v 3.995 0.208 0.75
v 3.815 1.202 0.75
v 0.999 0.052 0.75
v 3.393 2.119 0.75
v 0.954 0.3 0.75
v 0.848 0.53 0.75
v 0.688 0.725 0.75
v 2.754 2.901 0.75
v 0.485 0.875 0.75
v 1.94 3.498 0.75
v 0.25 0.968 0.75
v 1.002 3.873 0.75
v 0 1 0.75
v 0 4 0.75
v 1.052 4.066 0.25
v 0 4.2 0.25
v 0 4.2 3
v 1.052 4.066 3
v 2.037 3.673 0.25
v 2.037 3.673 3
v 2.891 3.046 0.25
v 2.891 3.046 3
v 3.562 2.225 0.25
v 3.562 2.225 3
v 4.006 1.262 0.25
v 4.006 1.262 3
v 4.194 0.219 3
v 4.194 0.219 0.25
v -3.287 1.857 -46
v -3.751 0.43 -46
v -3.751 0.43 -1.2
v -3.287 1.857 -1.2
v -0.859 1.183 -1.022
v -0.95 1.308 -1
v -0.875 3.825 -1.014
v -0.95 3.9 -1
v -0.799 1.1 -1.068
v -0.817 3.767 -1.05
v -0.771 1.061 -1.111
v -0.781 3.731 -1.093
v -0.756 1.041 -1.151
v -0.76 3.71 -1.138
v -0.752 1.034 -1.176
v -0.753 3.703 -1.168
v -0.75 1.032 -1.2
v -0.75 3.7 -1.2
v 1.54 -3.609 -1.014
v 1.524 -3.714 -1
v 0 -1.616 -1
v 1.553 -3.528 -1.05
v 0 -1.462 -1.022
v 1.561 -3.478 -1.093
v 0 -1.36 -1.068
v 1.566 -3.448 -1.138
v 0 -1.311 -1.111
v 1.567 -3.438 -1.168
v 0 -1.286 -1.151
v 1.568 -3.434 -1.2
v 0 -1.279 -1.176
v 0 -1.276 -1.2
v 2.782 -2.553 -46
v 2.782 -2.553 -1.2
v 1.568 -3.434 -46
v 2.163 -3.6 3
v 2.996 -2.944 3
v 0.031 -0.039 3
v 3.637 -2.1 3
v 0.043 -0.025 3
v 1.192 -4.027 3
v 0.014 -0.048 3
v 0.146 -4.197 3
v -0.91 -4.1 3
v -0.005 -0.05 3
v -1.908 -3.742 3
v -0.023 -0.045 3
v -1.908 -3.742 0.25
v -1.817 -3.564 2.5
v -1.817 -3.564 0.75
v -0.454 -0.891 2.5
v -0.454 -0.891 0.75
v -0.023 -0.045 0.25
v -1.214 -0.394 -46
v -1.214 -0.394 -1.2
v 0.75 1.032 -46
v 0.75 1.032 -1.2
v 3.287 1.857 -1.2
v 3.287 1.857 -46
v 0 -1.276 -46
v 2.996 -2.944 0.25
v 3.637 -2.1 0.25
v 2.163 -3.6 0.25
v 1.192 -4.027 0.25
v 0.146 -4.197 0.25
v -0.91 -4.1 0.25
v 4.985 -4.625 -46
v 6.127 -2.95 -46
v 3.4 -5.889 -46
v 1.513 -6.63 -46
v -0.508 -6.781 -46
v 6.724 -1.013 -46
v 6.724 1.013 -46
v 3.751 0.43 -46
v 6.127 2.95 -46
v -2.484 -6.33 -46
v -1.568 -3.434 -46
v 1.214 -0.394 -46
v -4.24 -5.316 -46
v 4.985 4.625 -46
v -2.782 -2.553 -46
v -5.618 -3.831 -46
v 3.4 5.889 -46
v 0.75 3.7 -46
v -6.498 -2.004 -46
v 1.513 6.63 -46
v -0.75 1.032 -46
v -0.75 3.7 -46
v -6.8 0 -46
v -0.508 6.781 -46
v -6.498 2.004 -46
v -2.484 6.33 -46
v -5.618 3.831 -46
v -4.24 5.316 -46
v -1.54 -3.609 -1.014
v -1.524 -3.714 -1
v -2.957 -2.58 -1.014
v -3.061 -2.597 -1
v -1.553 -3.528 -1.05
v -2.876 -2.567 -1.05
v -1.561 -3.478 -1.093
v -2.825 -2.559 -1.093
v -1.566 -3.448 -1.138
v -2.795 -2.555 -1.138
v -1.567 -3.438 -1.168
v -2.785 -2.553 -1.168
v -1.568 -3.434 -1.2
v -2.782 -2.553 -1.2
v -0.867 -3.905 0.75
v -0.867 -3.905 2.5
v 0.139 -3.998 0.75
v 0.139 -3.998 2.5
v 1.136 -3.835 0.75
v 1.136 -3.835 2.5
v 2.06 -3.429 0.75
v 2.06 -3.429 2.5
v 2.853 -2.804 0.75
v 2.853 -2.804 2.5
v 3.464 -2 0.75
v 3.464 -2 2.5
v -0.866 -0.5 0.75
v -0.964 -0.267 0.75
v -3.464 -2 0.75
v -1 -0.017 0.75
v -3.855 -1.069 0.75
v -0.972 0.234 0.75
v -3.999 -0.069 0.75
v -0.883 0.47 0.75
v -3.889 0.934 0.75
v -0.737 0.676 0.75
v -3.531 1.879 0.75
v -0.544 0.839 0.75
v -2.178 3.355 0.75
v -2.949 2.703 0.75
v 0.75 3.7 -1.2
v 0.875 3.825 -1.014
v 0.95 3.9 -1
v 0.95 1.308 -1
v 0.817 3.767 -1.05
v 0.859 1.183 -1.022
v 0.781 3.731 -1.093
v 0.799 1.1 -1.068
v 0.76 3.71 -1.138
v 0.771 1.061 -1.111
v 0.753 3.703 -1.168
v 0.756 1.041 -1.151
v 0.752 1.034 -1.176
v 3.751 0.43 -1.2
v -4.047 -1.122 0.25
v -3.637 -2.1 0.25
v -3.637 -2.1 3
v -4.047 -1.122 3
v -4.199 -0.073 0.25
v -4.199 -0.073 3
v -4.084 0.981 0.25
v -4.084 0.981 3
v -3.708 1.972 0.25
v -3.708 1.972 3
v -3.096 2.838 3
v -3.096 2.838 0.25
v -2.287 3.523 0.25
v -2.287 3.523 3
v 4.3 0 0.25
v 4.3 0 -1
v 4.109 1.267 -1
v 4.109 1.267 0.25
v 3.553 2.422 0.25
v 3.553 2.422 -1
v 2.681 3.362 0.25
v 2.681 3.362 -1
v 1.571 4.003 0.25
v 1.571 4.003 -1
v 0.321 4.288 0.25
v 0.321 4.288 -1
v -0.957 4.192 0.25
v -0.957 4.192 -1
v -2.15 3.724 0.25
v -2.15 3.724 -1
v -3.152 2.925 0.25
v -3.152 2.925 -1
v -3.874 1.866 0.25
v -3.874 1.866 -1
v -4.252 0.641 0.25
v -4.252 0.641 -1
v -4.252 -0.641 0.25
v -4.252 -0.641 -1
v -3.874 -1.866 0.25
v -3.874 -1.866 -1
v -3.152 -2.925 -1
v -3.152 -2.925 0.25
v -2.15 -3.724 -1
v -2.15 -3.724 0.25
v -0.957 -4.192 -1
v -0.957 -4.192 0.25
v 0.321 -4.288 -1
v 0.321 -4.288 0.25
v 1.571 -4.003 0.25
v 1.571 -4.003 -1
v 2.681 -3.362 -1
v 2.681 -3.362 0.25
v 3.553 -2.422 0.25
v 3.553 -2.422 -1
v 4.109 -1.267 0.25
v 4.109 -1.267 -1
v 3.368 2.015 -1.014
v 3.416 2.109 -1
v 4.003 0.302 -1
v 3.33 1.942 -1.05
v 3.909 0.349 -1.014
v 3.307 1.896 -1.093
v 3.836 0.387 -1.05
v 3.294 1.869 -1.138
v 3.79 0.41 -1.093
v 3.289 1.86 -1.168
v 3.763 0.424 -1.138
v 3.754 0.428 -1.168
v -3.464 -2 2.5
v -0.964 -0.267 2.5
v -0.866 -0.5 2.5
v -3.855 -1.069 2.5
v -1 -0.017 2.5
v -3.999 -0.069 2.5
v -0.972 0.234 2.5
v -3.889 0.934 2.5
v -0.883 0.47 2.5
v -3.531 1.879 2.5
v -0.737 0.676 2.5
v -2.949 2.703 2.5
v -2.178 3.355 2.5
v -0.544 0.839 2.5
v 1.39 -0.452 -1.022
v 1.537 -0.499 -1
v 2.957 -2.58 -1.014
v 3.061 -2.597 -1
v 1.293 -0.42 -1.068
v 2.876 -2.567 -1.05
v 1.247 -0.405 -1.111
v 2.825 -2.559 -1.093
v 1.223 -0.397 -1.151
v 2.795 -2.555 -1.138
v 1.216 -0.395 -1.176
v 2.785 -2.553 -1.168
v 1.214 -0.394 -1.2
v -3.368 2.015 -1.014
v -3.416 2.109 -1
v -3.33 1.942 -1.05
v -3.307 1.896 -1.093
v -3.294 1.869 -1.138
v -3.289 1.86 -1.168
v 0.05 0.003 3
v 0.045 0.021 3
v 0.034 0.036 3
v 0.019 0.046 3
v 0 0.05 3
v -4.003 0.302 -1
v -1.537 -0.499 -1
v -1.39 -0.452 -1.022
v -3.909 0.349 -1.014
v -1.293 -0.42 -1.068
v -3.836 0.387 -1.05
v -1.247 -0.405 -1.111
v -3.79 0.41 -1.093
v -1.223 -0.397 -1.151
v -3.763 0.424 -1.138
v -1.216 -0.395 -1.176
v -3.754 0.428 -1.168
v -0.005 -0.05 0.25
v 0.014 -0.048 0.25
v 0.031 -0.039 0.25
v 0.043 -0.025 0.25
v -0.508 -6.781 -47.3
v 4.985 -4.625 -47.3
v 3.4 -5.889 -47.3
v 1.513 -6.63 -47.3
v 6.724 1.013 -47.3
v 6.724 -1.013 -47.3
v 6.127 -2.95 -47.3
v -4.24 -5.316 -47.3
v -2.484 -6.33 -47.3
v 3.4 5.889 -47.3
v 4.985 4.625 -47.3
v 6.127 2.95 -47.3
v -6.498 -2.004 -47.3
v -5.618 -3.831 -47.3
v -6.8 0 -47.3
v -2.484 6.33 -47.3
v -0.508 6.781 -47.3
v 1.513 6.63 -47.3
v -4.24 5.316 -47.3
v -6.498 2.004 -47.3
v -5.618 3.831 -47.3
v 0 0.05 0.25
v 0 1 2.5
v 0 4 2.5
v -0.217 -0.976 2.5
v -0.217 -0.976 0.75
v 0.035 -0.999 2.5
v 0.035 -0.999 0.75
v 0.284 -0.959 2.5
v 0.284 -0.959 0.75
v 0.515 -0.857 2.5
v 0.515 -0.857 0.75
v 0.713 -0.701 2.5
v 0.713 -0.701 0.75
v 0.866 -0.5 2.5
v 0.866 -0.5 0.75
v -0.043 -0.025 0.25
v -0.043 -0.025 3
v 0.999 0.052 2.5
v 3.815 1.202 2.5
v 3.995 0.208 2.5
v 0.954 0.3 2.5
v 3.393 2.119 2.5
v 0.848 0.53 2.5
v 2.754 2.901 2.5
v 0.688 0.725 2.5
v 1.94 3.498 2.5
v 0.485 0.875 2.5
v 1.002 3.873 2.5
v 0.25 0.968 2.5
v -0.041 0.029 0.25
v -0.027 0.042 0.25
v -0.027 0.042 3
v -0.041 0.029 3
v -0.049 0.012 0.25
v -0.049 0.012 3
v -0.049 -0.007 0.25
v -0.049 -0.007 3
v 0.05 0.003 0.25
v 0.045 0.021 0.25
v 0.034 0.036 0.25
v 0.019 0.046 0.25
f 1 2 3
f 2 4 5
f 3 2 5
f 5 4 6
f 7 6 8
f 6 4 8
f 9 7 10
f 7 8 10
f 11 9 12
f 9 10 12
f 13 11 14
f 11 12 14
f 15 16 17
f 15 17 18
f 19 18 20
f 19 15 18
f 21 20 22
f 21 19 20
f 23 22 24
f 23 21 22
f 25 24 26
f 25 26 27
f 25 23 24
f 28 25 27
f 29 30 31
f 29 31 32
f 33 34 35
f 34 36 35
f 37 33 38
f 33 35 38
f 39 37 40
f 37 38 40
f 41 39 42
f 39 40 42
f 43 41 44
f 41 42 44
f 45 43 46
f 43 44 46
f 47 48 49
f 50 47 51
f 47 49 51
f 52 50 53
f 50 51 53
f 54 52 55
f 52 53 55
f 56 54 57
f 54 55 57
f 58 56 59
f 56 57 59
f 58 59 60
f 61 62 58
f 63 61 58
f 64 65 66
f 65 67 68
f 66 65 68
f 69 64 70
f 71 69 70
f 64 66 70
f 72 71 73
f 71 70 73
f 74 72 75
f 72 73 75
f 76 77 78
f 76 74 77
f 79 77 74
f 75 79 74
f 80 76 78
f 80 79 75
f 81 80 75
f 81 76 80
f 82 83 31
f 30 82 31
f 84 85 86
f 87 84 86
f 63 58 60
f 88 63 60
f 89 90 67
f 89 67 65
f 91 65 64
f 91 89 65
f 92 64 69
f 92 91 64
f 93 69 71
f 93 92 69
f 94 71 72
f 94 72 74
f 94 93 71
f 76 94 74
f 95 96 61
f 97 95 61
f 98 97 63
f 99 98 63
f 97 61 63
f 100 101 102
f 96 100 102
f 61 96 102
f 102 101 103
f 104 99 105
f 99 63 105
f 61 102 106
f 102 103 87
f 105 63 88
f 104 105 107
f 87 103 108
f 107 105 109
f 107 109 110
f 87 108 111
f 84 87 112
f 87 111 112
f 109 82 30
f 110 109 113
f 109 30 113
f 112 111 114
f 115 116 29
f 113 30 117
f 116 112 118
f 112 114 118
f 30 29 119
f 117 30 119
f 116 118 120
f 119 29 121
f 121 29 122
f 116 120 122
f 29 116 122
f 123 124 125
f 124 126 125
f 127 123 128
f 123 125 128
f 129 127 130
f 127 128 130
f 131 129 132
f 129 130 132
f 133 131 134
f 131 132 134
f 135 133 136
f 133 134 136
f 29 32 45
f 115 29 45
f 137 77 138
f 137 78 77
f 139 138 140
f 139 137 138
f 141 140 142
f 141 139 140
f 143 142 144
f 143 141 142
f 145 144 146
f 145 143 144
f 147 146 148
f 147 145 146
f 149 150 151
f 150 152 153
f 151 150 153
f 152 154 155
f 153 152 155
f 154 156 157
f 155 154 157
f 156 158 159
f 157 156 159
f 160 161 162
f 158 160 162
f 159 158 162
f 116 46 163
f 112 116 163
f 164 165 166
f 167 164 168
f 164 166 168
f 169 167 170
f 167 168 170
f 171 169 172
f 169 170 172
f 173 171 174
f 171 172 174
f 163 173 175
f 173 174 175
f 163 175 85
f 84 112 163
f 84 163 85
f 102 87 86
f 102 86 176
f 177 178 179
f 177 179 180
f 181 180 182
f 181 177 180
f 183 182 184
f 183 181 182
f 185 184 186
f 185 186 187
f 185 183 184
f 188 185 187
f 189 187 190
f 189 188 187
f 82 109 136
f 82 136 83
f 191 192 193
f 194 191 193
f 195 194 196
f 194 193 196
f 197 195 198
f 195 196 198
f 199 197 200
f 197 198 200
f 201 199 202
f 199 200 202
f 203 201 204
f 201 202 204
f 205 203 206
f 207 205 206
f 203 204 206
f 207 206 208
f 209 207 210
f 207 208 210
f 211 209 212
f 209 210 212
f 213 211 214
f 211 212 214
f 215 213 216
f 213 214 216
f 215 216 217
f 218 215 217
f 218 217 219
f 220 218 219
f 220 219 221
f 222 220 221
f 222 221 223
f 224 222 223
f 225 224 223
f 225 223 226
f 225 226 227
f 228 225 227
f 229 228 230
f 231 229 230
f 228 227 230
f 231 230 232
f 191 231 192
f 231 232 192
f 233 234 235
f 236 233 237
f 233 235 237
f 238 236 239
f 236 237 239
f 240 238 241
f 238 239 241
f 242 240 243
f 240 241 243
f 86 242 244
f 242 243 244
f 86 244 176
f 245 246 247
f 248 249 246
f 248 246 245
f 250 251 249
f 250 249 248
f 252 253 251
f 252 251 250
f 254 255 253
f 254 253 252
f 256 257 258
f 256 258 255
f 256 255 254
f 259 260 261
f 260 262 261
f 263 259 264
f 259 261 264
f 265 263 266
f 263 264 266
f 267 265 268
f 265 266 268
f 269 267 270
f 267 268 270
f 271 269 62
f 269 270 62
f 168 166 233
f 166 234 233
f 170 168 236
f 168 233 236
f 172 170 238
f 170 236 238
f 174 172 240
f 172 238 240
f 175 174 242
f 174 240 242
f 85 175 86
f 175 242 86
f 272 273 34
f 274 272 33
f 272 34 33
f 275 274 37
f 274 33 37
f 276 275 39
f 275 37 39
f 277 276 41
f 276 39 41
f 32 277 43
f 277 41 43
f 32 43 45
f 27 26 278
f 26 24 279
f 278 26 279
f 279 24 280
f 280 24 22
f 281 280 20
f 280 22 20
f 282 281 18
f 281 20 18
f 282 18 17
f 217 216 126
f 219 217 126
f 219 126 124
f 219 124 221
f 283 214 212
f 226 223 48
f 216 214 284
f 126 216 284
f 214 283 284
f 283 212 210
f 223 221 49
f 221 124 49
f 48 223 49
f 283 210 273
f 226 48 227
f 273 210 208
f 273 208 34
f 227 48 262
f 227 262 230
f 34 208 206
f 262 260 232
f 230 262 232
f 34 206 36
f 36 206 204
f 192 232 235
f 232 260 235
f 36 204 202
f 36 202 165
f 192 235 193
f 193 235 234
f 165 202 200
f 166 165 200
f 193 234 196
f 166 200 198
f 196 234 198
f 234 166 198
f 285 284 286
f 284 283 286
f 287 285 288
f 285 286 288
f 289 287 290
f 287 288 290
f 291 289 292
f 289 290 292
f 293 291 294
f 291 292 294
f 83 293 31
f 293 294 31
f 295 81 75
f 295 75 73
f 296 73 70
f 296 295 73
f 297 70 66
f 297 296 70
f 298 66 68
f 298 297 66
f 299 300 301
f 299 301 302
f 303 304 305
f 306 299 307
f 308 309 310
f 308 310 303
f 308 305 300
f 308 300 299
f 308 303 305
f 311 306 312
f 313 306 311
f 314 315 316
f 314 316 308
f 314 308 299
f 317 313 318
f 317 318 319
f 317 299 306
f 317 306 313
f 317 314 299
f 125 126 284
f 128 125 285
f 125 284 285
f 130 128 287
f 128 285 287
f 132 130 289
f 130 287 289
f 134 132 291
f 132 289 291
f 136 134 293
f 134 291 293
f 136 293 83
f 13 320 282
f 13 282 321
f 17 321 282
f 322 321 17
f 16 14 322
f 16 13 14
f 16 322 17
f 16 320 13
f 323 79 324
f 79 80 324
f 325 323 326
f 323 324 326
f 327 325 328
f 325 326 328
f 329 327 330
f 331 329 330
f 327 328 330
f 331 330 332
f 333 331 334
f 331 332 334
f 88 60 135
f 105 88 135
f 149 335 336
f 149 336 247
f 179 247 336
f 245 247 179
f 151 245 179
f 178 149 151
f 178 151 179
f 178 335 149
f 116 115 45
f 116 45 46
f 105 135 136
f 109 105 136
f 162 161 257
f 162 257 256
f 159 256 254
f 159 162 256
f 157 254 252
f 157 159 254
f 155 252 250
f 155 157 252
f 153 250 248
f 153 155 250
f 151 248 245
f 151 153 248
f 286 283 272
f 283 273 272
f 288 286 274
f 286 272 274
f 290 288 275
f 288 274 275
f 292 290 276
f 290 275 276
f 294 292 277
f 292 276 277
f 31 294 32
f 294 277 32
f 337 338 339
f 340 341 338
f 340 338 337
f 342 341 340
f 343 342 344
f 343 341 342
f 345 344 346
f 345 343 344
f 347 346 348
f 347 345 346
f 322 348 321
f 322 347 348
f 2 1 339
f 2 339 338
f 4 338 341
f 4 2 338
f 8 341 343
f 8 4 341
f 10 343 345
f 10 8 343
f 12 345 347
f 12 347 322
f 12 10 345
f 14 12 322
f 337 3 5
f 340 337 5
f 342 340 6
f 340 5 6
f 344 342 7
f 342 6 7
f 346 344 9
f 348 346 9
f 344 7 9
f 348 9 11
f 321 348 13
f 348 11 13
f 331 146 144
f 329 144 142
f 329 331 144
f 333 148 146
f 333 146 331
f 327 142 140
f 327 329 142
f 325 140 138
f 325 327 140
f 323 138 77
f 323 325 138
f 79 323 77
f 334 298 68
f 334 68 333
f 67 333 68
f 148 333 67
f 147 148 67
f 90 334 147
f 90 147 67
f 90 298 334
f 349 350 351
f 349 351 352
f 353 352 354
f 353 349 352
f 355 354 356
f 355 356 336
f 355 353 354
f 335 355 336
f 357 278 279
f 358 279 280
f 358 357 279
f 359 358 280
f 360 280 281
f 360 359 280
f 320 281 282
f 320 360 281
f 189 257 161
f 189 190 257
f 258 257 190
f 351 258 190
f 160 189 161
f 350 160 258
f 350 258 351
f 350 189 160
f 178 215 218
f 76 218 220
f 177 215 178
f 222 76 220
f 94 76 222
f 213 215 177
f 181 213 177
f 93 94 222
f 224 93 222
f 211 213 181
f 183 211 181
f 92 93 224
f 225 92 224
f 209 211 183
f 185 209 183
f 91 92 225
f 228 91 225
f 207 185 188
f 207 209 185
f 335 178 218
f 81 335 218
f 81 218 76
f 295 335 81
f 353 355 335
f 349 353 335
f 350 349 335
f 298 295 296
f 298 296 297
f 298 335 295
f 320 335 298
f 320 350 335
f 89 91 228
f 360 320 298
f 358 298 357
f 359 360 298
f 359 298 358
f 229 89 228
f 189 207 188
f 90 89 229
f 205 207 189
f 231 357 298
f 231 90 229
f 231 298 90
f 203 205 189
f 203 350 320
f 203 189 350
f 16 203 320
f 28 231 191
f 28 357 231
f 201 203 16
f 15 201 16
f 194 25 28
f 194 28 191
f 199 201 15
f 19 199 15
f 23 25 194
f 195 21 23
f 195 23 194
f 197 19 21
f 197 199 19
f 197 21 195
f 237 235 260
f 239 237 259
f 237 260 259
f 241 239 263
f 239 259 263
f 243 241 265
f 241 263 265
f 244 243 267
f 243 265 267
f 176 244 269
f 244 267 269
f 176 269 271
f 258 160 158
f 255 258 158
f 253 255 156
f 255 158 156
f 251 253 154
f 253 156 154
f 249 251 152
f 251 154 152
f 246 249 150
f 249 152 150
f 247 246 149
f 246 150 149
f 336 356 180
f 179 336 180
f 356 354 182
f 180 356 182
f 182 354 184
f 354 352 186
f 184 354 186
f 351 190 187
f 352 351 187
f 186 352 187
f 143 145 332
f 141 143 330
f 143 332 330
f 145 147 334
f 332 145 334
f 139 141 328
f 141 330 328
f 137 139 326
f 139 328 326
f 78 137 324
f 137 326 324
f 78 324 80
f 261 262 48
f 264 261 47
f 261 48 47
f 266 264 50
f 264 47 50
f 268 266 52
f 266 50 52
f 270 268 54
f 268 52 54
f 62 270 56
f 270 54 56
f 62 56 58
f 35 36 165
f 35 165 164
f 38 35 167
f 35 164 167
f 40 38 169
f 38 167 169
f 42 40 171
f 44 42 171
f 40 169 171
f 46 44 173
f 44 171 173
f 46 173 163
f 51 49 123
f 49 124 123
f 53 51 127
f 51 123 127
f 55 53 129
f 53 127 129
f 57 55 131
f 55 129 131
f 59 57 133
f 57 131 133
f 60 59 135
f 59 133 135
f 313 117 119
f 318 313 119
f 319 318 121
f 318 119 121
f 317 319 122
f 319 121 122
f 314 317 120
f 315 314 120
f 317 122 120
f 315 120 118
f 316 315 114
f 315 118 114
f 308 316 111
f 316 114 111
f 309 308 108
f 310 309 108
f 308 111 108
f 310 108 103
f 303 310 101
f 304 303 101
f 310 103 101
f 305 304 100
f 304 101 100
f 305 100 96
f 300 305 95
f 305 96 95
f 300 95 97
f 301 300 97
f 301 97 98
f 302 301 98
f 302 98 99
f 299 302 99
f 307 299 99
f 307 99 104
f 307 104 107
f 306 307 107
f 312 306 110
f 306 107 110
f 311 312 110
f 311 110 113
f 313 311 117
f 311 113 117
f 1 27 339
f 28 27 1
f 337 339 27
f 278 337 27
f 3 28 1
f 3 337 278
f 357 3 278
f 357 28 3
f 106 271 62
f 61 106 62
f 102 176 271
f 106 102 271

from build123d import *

# Parameters (mm, degrees)
EXTRU_MINCE1_DEPTH      = 3
EXTRU_MINCE1_2_DEPTH    = 3
EXTRU_MINCE1_3_DEPTH    = 3
BOSS_EXTRU_1_DEPTH      = 0.25
BOSS_EXTRU_1_DEPTH_BACK = 1
ESQUISSE3_R             = 4.3
ESQUISSE3_R_2           = 0.05
ESQUISSE4_W             = 1.75
ESQUISSE4_H             = 3
EXTRU_MINCE2_DEPTH      = 45
CONG_1_R                = 0.2
ESQUISSE6_R             = 6.8
BOSS_EXTRU_2_DEPTH      = 1.3


# Read off the part's stored shape, not the designer's step: Extru.-Mince2
with BuildPart() as part:
    # Esquisse2 → Extru.-Mince1 (new body)
    with BuildSketch(Plane.XY):
        with BuildLine():
            ThreePointArc((0, 4.2), (2.89149518, 3.046187063), (4.194302481, 0.218693153))
            Line((4.194302481, 0.218693153), (0.049932172, 0.00260349))
            ThreePointArc((0.049932172, 0.00260349), (0.034422562, 0.036264132), (0, 0.05))
            Line((0, 0.05), (0, 4.2))
        make_face()
    extrude(amount=EXTRU_MINCE1_DEPTH)



with BuildPart() as body_2:
    # Esquisse2 → Extru.-Mince1 2 (new body)
    with BuildSketch(Plane.XY):
        with BuildLine():
            ThreePointArc((3.637306696, -2.1), (1.192327791, -4.027201813), (-1.907757414, -3.741719077))
            Line((-1.907757414, -3.741719077), (-0.022711398, -0.044544275))
            ThreePointArc((-0.022711398, -0.044544275), (0.014194378, -0.047942879), (0.04330127, -0.025))
            Line((0.04330127, -0.025), (3.637306696, -2.1))
        make_face()
    extrude(amount=EXTRU_MINCE1_2_DEPTH)


with BuildPart() as body_3:
    # Esquisse2 → Extru.-Mince1 3 (new body)
    with BuildSketch(Plane.XY):
        with BuildLine():
            ThreePointArc((-3.637306696, -2.1), (-4.083822971, 0.98101475), (-2.286545067, 3.523025923))
            Line((-2.286545067, 3.523025923), (-0.027220775, 0.041940785))
            ThreePointArc((-0.027220775, 0.041940785), (-0.04861694, 0.011678747), (-0.04330127, -0.025))
            Line((-0.04330127, -0.025), (-3.637306696, -2.1))
        make_face()
    extrude(amount=EXTRU_MINCE1_3_DEPTH)


with BuildPart() as part_1:
    add(part.part)

    add(body_2.part)  # Boss.-Extru.1 merges body 2

    add(body_3.part)  # Boss.-Extru.1 merges body 3
    # Esquisse3 → Boss.-Extru.1 (add, two sides: drawn at the far end of the back side and taken through both)
    # profile 1 of 2: a face of its own
    with BuildSketch(Plane.XY.offset(-BOSS_EXTRU_1_DEPTH_BACK)):
        Circle(ESQUISSE3_R)
        Circle(ESQUISSE3_R_2, mode=Mode.SUBTRACT)
    # profile 2 of 2: a face of its own
    with BuildSketch(Plane.XY.offset(-BOSS_EXTRU_1_DEPTH_BACK)):
        Circle(ESQUISSE3_R_2)
    extrude(amount=BOSS_EXTRU_1_DEPTH + BOSS_EXTRU_1_DEPTH_BACK)

    # Esquisse4 → Enlèvement de matière-Révolution1 (revolve, cut)
    with BuildSketch(Plane(origin=(0, 0, 0), x_dir=(0, 0, -1), z_dir=(1, 0, 0)), mode=Mode.PRIVATE) as enl_vement_de_mati_re_r_volution1_sk:
        with Locations((-1.625, 2.5)):
            Rectangle(ESQUISSE4_W, ESQUISSE4_H)
    revolve(enl_vement_de_mati_re_r_volution1_sk.sketch.rotate(Axis((0, 0, 0), (0, 0, 1)), 270), axis=Axis((0, 0, 0), (0, 0, 1)), mode=Mode.SUBTRACT)

    # Extru.-Mince2 outline → Extru.-Mince2 (add)
    with BuildSketch(Plane(origin=(0, 0, -1), x_dir=(-1, 0, 0), z_dir=(0, 0, -1))):
        Polygon((0.75, 1.03228644), (0.75, 3.7), (-0.75, 3.7), (-0.75, 1.03228644), (-3.287146365, 1.856655266), (-3.750671856, 0.430070492), (-1.213525492, -0.394298334), (-2.781568179, -2.55252394), (-1.568042688, -3.434201818), (0, -1.275976213), (1.568042688, -3.434201818), (2.781568179, -2.55252394), (1.213525492, -0.394298334), (3.750671856, 0.430070492), (3.287146365, 1.856655266), align=None)
    extrude(amount=EXTRU_MINCE2_DEPTH)

    # Congé1
    cong_1_edges = [part_1.edges().sort_by_distance(p)[0] for p in [
        (1.997546836, -1.473411137, -1),
        (2.018573182, 1.444470853, -1),
        (-2.482098674, 0.017886079, -1),
        (2.482098674, 0.017886079, -1),
        (3.518909111, 1.143362879, -1),
        (0.75, 2.36614322, -1),
        (0, 3.7, -1),
        (-2.018573182, 1.444470853, -1),
        (-3.51890911, 1.143362879, -1),
        (-1.997546836, -1.473411137, -1),
        (-2.174805433, -2.993362879, -1),
        (0.784021344, -2.355089015, -1),
        (2.174805433, -2.993362879, -1),
        (-0.75, 2.36614322, -1),
        (-0.784021344, -2.355089015, -1),
    ]]
    fillet(cong_1_edges, radius=CONG_1_R)

    # Esquisse6 → Boss.-Extru.2 (add)
    with BuildSketch(Plane(origin=(0, 0, -46), x_dir=(-1, 0, 0), z_dir=(0, 0, -1))):
        Circle(ESQUISSE6_R)
    extrude(amount=BOSS_EXTRU_2_DEPTH)


solid = part_1.part
